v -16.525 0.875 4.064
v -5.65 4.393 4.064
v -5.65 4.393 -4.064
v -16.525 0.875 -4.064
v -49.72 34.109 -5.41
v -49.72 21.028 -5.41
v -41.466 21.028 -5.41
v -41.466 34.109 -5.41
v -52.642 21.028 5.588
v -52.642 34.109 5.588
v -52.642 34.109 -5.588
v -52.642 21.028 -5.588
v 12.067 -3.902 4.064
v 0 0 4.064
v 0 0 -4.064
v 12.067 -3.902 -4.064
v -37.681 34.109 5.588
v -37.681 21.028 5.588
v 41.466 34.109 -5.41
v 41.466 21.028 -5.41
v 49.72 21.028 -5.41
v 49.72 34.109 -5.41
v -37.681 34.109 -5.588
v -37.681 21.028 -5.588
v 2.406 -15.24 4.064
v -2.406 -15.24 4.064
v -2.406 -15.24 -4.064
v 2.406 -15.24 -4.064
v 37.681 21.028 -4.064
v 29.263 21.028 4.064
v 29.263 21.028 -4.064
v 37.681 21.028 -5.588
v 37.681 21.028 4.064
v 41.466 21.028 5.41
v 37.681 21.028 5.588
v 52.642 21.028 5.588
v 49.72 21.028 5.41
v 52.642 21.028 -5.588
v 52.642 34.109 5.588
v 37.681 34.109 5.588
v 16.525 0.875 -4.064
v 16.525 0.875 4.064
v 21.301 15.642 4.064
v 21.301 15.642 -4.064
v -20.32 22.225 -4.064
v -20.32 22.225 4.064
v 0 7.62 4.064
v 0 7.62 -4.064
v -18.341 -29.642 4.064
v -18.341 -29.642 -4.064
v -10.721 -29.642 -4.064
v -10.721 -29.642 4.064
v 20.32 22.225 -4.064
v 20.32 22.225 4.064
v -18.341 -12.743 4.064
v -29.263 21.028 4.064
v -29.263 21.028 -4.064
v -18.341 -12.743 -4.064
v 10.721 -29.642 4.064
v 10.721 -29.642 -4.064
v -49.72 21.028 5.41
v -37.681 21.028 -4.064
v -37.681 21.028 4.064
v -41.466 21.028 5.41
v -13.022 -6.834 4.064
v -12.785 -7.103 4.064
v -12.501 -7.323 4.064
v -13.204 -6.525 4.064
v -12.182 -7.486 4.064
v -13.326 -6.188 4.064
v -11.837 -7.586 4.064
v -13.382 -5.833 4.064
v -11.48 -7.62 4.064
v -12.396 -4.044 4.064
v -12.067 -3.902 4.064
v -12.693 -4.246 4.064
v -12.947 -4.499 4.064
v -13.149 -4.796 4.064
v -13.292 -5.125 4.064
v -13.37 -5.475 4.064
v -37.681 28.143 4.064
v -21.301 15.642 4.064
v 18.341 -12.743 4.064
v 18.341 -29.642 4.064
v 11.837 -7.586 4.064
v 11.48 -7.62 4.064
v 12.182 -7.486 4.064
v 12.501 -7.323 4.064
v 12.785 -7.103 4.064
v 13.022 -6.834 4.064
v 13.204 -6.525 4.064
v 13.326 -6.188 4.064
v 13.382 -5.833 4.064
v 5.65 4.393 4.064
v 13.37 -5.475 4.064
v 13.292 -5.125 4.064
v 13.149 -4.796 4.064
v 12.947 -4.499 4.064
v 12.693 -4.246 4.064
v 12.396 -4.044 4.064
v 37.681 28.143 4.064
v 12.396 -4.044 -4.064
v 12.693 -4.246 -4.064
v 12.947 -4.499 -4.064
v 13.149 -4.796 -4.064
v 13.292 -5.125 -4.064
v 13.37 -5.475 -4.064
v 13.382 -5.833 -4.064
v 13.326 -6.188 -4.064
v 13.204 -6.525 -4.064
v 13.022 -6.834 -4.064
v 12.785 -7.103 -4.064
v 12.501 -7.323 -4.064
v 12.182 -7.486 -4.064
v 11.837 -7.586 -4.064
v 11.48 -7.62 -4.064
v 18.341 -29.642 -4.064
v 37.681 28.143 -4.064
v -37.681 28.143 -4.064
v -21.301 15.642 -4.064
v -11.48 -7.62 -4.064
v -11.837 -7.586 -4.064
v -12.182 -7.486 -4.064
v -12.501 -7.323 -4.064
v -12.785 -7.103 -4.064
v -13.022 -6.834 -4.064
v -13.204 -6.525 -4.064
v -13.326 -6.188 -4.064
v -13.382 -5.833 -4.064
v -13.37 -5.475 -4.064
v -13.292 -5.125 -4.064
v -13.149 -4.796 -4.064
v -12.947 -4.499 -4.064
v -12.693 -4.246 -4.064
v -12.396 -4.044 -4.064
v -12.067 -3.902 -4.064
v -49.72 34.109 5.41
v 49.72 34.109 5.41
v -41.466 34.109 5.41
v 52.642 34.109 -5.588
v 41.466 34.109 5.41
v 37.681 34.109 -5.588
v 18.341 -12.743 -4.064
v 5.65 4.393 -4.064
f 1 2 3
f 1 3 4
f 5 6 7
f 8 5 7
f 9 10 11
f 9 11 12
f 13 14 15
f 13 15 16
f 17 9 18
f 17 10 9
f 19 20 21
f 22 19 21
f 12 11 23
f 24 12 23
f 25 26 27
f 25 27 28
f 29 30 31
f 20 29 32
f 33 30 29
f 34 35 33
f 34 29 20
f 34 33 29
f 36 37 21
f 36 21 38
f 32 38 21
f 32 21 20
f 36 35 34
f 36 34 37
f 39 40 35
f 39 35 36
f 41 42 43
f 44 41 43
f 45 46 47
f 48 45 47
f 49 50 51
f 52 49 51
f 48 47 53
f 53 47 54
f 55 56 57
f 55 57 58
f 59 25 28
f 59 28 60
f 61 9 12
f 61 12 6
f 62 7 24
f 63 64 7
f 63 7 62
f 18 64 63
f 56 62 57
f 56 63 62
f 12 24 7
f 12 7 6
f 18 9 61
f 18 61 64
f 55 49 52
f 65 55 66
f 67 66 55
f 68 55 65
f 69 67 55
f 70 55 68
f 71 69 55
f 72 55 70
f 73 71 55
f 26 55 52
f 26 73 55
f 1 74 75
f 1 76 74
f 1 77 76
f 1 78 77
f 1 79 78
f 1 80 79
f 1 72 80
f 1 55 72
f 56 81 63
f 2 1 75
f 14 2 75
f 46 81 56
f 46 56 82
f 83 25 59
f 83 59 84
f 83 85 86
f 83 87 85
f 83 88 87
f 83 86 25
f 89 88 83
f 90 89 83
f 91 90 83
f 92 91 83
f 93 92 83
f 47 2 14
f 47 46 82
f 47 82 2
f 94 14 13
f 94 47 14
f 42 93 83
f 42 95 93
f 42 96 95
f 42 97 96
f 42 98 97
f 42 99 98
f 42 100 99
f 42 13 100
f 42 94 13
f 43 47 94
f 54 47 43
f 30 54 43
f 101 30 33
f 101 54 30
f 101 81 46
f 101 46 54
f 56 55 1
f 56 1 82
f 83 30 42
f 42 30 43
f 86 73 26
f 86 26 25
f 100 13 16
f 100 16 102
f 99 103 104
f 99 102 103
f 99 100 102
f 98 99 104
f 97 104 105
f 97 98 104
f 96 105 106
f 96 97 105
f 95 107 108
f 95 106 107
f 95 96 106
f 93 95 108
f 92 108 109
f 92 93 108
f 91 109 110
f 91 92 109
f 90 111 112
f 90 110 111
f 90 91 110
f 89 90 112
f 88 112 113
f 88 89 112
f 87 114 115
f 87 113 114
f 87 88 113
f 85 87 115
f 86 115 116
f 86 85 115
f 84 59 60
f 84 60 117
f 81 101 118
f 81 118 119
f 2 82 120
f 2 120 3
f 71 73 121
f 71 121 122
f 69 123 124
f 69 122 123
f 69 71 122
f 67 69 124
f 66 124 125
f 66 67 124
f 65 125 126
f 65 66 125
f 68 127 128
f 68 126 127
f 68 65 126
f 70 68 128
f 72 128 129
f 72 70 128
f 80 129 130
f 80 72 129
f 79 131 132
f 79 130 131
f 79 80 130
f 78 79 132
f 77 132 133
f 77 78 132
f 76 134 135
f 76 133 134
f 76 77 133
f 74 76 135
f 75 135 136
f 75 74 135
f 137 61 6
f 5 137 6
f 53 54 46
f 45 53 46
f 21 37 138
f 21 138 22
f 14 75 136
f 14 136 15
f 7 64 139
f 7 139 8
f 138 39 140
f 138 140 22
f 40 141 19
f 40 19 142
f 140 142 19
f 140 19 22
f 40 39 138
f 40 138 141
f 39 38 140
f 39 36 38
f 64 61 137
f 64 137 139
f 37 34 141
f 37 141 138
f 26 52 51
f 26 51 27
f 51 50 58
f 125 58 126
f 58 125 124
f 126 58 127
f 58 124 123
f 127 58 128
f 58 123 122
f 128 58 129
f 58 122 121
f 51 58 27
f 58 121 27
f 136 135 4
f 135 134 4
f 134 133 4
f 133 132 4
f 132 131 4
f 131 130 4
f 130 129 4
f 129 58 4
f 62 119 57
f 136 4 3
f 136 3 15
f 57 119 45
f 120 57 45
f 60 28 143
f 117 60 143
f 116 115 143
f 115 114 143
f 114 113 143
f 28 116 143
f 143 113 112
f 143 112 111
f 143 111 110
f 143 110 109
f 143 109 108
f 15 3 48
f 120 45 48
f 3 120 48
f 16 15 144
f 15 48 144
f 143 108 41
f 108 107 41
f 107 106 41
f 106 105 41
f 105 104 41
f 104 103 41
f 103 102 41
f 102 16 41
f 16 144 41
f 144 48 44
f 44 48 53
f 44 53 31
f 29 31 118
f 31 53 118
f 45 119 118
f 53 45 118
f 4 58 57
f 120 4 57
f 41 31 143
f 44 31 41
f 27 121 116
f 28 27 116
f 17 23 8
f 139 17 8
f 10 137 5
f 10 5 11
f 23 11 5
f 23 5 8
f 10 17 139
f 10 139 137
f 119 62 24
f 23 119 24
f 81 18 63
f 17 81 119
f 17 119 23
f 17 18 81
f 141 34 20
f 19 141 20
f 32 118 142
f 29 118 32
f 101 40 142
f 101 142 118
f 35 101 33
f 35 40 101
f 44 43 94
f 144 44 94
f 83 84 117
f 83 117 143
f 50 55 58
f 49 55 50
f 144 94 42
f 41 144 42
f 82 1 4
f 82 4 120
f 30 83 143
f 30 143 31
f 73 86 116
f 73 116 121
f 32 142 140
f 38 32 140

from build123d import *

# Parameters (mm, degrees)
BOSS_EXTRUDE1_DEPTH = 5.588
CUT_EXTRUDE1_REACH  = 80.367
SKETCH2_W           = 75.3618
SKETCH2_H           = 1.524
SKETCH3_W           = 8.255
SKETCH3_H           = 10.8204
CUT_EXTRUDE2_DEPTH  = 83.86461998


with BuildPart() as part:
    # Sketch1 → Boss-Extrude1 (new, symmetric)
    with BuildSketch(Plane.XY):
        Polygon((37.6809, 28.1432), (-37.6809, 28.1432), (-37.6809, 34.109215507), (-52.6415, 34.109215507), (-52.6415, 21.028215507), (-29.263085056, 21.028215507), (-18.341239915, -12.742623419), (-18.341239915, -29.6418), (-10.721239915, -29.6418), (-2.406356809, -15.24), (2.406356809, -15.24), (10.721239915, -29.6418), (18.341239915, -29.6418), (18.341239915, -12.742623419), (29.263085056, 21.028215507), (52.6415, 21.028215507), (52.6415, 34.109215507), (37.6809, 34.109215507), align=None)
        with BuildLine():
            Line((11.480303153, -7.62), (-11.480303153, -7.62))
            ThreePointArc((-11.480303153, -7.62), (-13.362052491, -6.011722817), (-12.066505741, -3.902435097))
            Line((-12.066505741, -3.902435097), (0, 0))
            Line((0, 0), (12.066505741, -3.902435097))
            ThreePointArc((12.066505741, -3.902435097), (13.362052491, -6.011722817), (11.480303153, -7.62))
        make_face(mode=Mode.SUBTRACT)
        Polygon((20.32, 22.225), (-20.32, 22.225), (0, 7.62), align=None, mode=Mode.SUBTRACT)
        Polygon((-21.301071122, 15.641859193), (-5.650084624, 4.392712647), (-16.52547404, 0.87549712), align=None, mode=Mode.SUBTRACT)
        Polygon((16.52547404, 0.87549712), (21.301071122, 15.641859193), (5.650084624, 4.392712647), align=None, mode=Mode.SUBTRACT)
    extrude(amount=BOSS_EXTRUDE1_DEPTH, both=True)

    # Cut-Extrude1: up to this face of the body (flat: up to its plane)
    cut_extrude1_end = Plane(part.part.faces().sort_by_distance((-14.531239915, -29.6418, 0))[0])
    # Sketch2 → Cut-Extrude1 (cut, up to the picked face)
    with BuildSketch(Plane(origin=(0, 28.1432, 0), x_dir=(1, 0, 0), z_dir=(0, 1, 0)), mode=Mode.PRIVATE) as cut_extrude1_sk1:
        with Locations((0, -4.826)):
            Rectangle(SKETCH2_W, SKETCH2_H)
    cut_extrude1_tool1 = split(extrude(cut_extrude1_sk1.sketch, amount=-CUT_EXTRUDE1_REACH, mode=Mode.PRIVATE), bisect_by=cut_extrude1_end, keep=Keep.BOTH, mode=Mode.PRIVATE)
    # Sketch2 → Cut-Extrude1 (cut, up to the picked face)
    with BuildSketch(Plane(origin=(0, 28.1432, 0), x_dir=(1, 0, 0), z_dir=(0, 1, 0)), mode=Mode.PRIVATE) as cut_extrude1_sk2:
        with Locations((0, 4.826)):
            Rectangle(SKETCH2_W, SKETCH2_H)
    cut_extrude1_tool2 = split(extrude(cut_extrude1_sk2.sketch, amount=-CUT_EXTRUDE1_REACH, mode=Mode.PRIVATE), bisect_by=cut_extrude1_end, keep=Keep.BOTH, mode=Mode.PRIVATE)
    add(cut_extrude1_tool1.solids().sort_by(Axis((0, 28.1432, 4.826), (0, -1, 0)))[0], mode=Mode.SUBTRACT)
    add(cut_extrude1_tool2.solids().sort_by(Axis((0, 28.1432, -4.826), (0, -1, 0)))[0], mode=Mode.SUBTRACT)

    # Sketch3 → Cut-Extrude2 (cut, through all)
    with BuildSketch(Plane(origin=(0, 34.109215507, 0), x_dir=(1, 0, 0), z_dir=(0, 1, 0))):
        with Locations((-45.593, 0)):
            Rectangle(SKETCH3_W, SKETCH3_H)
        with Locations((45.593, 0)):
            Rectangle(SKETCH3_W, SKETCH3_H)
    extrude(amount=-CUT_EXTRUDE2_DEPTH, mode=Mode.SUBTRACT)


solid = part.part
